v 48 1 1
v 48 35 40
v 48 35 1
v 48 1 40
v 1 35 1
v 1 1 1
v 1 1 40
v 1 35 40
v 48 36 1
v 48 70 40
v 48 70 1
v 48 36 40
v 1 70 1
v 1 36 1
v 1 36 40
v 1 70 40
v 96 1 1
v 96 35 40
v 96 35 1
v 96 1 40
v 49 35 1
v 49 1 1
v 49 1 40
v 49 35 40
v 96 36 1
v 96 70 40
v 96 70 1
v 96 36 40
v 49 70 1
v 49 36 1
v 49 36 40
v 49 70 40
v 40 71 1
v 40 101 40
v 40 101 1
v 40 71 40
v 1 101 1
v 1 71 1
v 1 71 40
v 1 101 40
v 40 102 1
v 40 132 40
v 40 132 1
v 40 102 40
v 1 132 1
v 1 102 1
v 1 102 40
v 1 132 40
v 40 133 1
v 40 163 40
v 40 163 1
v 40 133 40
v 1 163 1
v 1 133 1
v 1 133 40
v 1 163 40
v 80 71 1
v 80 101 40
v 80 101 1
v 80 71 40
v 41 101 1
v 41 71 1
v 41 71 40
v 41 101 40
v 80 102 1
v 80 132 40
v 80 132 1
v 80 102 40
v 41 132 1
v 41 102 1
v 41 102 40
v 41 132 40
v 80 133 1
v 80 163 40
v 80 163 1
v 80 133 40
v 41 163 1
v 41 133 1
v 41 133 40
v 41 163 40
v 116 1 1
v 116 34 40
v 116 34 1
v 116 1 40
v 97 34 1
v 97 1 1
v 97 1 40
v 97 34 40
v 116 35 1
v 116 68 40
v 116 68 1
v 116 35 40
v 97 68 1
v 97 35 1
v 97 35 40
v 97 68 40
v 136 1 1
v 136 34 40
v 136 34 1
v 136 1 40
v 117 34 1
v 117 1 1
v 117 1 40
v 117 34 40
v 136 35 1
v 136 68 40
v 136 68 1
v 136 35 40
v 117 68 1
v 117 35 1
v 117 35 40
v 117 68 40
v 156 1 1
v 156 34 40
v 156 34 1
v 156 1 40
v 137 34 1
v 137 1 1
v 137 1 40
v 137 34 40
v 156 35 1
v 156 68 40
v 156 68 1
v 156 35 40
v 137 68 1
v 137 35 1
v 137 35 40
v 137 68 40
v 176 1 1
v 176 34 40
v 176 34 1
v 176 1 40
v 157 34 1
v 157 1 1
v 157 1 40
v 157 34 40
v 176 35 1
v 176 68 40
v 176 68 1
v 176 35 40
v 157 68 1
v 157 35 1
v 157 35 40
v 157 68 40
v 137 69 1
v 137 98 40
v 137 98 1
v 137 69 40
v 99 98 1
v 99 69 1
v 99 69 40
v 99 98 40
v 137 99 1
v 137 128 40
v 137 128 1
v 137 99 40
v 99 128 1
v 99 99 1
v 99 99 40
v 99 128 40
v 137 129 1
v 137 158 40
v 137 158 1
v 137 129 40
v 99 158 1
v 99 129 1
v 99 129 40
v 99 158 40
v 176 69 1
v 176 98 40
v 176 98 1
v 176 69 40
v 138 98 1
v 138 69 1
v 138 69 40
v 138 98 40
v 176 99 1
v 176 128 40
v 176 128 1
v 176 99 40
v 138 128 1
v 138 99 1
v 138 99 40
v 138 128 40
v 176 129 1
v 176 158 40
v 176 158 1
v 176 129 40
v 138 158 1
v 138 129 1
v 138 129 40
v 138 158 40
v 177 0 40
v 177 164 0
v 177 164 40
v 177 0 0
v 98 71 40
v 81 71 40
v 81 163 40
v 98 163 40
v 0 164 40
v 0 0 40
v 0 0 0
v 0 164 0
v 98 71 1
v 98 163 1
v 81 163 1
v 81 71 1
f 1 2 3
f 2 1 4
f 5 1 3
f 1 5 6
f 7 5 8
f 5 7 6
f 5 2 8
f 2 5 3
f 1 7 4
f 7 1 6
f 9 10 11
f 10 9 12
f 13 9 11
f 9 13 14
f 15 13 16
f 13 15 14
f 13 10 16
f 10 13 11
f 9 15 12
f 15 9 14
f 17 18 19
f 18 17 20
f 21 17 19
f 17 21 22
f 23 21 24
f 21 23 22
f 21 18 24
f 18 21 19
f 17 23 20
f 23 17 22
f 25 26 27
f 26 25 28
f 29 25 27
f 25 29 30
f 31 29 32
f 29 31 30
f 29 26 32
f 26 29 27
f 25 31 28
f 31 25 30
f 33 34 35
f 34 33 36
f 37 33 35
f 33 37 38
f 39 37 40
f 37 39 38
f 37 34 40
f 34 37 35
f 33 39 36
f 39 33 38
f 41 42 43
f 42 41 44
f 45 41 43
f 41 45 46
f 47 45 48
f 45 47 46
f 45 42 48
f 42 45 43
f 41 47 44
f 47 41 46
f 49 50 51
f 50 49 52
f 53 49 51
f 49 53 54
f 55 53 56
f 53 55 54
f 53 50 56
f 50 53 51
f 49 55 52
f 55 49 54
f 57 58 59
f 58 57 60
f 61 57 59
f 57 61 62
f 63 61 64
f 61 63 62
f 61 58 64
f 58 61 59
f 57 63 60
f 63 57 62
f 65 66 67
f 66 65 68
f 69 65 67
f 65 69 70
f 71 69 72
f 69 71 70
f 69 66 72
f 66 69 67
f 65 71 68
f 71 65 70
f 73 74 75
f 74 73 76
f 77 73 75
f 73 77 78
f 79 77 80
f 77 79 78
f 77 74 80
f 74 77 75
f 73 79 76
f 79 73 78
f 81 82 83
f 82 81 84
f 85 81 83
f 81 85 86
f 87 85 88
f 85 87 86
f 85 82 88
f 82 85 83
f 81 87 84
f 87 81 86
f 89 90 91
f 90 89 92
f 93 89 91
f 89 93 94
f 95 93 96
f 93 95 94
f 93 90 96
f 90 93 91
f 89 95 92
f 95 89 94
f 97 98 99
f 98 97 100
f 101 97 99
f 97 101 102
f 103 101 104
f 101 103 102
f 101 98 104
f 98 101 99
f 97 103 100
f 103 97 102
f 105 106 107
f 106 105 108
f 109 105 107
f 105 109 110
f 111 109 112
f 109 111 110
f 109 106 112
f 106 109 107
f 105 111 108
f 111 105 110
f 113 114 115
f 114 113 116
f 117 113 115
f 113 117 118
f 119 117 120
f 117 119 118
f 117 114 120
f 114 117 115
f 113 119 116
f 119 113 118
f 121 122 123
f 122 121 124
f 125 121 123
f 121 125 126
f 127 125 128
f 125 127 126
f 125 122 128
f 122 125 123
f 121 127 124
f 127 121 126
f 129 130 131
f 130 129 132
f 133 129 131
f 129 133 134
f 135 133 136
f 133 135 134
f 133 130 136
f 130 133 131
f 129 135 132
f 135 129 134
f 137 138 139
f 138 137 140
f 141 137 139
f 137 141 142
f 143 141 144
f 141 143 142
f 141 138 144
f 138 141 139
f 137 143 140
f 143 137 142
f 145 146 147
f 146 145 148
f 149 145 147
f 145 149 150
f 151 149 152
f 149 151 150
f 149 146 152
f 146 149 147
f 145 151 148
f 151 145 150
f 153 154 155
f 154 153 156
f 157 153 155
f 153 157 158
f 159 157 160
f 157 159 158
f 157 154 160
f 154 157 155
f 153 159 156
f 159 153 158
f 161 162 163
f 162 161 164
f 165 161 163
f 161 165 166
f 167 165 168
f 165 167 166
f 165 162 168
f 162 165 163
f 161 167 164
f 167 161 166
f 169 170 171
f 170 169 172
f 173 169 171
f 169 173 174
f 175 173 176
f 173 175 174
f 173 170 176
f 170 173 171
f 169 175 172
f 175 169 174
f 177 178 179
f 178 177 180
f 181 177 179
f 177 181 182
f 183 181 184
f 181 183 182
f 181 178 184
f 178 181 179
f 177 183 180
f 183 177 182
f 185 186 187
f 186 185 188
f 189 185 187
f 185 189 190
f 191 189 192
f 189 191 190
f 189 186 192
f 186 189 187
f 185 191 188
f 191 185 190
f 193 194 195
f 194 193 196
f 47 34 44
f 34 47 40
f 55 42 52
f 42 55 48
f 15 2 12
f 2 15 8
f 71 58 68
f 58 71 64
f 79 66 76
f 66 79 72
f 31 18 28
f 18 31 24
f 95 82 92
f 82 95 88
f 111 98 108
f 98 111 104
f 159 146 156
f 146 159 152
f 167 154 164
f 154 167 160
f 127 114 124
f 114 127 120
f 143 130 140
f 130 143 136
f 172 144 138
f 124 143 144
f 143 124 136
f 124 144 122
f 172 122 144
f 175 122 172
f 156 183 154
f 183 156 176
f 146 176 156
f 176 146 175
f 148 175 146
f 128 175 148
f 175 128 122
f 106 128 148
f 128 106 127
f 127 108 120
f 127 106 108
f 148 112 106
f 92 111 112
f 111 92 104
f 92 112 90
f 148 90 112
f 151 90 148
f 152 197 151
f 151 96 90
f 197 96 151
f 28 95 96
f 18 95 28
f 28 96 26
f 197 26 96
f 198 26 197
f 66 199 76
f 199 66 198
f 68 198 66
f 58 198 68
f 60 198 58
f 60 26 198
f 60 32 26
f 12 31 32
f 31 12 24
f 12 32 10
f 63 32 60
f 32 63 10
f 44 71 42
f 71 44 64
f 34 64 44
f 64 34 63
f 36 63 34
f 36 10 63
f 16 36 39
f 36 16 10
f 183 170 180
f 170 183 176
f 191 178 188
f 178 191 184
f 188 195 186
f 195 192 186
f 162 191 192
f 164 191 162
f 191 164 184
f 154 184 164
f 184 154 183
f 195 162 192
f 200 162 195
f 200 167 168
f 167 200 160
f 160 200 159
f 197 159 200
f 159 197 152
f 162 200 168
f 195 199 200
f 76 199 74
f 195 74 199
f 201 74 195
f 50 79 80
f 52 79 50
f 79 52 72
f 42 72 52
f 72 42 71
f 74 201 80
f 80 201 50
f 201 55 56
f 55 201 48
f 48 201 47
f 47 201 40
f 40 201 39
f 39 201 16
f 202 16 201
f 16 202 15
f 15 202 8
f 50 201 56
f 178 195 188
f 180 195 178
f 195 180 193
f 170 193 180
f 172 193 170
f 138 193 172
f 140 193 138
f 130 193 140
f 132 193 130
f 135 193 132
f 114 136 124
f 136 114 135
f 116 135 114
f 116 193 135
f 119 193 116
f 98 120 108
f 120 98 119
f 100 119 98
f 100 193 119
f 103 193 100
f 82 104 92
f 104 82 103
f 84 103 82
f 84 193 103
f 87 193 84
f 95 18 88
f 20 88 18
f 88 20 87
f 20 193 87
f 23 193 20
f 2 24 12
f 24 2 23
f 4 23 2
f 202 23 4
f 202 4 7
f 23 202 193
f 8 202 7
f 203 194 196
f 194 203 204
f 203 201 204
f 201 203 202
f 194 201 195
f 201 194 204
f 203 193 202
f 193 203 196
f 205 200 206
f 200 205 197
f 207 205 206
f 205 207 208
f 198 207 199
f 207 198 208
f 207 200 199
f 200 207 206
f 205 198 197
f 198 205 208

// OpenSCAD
ww=1;
hh=30;
zinf=hh*2;


module block(xx,yy,offx,offy,nx,ny,s) {
    translate([offx+ww,offy+ww,ww]) {
        for (i = [0:1:nx-1]) {
            for (j = [0:1:ny-1]) {
                translate([i*(xx+ww),j*(yy+ww),0]) {
                    cube([xx,yy,zinf]);
                }
            }
        }
    }
}

difference() {
    cube([177,164,40]);
    //translate([ww,ww,0]) {
    block(47,34,0,0,2,2, "4s 3300");
    block(39,30,0,70,2,3,"4s 1800");
    block(19,33,96,0,4,2, "3s 500");
    block(38,29,98,68,2,3, "3s 1300");
    block(17,92,80,70,1,1,"hole");
    //}
}

    // 3300 4s 47 34
//    translate([0+ww,0+ww,ww])  cube([47,34,zinf]);
 //   translate([49,1,ww]) cube([47,34,zinf]);
  //  translate([1,36,ww])  cube([47,34,zinf]);
   // translate([49,36,ww]) cube([47,34,zinf]);
    // 4s 1800 39 30
   // translate([1,71,ww]) cube([39,30,zinf]);
   // translate([41,71,ww]) cube([39,30,zinf]);
   // translate([41,71,ww]) cube([39,30,zinf]);
